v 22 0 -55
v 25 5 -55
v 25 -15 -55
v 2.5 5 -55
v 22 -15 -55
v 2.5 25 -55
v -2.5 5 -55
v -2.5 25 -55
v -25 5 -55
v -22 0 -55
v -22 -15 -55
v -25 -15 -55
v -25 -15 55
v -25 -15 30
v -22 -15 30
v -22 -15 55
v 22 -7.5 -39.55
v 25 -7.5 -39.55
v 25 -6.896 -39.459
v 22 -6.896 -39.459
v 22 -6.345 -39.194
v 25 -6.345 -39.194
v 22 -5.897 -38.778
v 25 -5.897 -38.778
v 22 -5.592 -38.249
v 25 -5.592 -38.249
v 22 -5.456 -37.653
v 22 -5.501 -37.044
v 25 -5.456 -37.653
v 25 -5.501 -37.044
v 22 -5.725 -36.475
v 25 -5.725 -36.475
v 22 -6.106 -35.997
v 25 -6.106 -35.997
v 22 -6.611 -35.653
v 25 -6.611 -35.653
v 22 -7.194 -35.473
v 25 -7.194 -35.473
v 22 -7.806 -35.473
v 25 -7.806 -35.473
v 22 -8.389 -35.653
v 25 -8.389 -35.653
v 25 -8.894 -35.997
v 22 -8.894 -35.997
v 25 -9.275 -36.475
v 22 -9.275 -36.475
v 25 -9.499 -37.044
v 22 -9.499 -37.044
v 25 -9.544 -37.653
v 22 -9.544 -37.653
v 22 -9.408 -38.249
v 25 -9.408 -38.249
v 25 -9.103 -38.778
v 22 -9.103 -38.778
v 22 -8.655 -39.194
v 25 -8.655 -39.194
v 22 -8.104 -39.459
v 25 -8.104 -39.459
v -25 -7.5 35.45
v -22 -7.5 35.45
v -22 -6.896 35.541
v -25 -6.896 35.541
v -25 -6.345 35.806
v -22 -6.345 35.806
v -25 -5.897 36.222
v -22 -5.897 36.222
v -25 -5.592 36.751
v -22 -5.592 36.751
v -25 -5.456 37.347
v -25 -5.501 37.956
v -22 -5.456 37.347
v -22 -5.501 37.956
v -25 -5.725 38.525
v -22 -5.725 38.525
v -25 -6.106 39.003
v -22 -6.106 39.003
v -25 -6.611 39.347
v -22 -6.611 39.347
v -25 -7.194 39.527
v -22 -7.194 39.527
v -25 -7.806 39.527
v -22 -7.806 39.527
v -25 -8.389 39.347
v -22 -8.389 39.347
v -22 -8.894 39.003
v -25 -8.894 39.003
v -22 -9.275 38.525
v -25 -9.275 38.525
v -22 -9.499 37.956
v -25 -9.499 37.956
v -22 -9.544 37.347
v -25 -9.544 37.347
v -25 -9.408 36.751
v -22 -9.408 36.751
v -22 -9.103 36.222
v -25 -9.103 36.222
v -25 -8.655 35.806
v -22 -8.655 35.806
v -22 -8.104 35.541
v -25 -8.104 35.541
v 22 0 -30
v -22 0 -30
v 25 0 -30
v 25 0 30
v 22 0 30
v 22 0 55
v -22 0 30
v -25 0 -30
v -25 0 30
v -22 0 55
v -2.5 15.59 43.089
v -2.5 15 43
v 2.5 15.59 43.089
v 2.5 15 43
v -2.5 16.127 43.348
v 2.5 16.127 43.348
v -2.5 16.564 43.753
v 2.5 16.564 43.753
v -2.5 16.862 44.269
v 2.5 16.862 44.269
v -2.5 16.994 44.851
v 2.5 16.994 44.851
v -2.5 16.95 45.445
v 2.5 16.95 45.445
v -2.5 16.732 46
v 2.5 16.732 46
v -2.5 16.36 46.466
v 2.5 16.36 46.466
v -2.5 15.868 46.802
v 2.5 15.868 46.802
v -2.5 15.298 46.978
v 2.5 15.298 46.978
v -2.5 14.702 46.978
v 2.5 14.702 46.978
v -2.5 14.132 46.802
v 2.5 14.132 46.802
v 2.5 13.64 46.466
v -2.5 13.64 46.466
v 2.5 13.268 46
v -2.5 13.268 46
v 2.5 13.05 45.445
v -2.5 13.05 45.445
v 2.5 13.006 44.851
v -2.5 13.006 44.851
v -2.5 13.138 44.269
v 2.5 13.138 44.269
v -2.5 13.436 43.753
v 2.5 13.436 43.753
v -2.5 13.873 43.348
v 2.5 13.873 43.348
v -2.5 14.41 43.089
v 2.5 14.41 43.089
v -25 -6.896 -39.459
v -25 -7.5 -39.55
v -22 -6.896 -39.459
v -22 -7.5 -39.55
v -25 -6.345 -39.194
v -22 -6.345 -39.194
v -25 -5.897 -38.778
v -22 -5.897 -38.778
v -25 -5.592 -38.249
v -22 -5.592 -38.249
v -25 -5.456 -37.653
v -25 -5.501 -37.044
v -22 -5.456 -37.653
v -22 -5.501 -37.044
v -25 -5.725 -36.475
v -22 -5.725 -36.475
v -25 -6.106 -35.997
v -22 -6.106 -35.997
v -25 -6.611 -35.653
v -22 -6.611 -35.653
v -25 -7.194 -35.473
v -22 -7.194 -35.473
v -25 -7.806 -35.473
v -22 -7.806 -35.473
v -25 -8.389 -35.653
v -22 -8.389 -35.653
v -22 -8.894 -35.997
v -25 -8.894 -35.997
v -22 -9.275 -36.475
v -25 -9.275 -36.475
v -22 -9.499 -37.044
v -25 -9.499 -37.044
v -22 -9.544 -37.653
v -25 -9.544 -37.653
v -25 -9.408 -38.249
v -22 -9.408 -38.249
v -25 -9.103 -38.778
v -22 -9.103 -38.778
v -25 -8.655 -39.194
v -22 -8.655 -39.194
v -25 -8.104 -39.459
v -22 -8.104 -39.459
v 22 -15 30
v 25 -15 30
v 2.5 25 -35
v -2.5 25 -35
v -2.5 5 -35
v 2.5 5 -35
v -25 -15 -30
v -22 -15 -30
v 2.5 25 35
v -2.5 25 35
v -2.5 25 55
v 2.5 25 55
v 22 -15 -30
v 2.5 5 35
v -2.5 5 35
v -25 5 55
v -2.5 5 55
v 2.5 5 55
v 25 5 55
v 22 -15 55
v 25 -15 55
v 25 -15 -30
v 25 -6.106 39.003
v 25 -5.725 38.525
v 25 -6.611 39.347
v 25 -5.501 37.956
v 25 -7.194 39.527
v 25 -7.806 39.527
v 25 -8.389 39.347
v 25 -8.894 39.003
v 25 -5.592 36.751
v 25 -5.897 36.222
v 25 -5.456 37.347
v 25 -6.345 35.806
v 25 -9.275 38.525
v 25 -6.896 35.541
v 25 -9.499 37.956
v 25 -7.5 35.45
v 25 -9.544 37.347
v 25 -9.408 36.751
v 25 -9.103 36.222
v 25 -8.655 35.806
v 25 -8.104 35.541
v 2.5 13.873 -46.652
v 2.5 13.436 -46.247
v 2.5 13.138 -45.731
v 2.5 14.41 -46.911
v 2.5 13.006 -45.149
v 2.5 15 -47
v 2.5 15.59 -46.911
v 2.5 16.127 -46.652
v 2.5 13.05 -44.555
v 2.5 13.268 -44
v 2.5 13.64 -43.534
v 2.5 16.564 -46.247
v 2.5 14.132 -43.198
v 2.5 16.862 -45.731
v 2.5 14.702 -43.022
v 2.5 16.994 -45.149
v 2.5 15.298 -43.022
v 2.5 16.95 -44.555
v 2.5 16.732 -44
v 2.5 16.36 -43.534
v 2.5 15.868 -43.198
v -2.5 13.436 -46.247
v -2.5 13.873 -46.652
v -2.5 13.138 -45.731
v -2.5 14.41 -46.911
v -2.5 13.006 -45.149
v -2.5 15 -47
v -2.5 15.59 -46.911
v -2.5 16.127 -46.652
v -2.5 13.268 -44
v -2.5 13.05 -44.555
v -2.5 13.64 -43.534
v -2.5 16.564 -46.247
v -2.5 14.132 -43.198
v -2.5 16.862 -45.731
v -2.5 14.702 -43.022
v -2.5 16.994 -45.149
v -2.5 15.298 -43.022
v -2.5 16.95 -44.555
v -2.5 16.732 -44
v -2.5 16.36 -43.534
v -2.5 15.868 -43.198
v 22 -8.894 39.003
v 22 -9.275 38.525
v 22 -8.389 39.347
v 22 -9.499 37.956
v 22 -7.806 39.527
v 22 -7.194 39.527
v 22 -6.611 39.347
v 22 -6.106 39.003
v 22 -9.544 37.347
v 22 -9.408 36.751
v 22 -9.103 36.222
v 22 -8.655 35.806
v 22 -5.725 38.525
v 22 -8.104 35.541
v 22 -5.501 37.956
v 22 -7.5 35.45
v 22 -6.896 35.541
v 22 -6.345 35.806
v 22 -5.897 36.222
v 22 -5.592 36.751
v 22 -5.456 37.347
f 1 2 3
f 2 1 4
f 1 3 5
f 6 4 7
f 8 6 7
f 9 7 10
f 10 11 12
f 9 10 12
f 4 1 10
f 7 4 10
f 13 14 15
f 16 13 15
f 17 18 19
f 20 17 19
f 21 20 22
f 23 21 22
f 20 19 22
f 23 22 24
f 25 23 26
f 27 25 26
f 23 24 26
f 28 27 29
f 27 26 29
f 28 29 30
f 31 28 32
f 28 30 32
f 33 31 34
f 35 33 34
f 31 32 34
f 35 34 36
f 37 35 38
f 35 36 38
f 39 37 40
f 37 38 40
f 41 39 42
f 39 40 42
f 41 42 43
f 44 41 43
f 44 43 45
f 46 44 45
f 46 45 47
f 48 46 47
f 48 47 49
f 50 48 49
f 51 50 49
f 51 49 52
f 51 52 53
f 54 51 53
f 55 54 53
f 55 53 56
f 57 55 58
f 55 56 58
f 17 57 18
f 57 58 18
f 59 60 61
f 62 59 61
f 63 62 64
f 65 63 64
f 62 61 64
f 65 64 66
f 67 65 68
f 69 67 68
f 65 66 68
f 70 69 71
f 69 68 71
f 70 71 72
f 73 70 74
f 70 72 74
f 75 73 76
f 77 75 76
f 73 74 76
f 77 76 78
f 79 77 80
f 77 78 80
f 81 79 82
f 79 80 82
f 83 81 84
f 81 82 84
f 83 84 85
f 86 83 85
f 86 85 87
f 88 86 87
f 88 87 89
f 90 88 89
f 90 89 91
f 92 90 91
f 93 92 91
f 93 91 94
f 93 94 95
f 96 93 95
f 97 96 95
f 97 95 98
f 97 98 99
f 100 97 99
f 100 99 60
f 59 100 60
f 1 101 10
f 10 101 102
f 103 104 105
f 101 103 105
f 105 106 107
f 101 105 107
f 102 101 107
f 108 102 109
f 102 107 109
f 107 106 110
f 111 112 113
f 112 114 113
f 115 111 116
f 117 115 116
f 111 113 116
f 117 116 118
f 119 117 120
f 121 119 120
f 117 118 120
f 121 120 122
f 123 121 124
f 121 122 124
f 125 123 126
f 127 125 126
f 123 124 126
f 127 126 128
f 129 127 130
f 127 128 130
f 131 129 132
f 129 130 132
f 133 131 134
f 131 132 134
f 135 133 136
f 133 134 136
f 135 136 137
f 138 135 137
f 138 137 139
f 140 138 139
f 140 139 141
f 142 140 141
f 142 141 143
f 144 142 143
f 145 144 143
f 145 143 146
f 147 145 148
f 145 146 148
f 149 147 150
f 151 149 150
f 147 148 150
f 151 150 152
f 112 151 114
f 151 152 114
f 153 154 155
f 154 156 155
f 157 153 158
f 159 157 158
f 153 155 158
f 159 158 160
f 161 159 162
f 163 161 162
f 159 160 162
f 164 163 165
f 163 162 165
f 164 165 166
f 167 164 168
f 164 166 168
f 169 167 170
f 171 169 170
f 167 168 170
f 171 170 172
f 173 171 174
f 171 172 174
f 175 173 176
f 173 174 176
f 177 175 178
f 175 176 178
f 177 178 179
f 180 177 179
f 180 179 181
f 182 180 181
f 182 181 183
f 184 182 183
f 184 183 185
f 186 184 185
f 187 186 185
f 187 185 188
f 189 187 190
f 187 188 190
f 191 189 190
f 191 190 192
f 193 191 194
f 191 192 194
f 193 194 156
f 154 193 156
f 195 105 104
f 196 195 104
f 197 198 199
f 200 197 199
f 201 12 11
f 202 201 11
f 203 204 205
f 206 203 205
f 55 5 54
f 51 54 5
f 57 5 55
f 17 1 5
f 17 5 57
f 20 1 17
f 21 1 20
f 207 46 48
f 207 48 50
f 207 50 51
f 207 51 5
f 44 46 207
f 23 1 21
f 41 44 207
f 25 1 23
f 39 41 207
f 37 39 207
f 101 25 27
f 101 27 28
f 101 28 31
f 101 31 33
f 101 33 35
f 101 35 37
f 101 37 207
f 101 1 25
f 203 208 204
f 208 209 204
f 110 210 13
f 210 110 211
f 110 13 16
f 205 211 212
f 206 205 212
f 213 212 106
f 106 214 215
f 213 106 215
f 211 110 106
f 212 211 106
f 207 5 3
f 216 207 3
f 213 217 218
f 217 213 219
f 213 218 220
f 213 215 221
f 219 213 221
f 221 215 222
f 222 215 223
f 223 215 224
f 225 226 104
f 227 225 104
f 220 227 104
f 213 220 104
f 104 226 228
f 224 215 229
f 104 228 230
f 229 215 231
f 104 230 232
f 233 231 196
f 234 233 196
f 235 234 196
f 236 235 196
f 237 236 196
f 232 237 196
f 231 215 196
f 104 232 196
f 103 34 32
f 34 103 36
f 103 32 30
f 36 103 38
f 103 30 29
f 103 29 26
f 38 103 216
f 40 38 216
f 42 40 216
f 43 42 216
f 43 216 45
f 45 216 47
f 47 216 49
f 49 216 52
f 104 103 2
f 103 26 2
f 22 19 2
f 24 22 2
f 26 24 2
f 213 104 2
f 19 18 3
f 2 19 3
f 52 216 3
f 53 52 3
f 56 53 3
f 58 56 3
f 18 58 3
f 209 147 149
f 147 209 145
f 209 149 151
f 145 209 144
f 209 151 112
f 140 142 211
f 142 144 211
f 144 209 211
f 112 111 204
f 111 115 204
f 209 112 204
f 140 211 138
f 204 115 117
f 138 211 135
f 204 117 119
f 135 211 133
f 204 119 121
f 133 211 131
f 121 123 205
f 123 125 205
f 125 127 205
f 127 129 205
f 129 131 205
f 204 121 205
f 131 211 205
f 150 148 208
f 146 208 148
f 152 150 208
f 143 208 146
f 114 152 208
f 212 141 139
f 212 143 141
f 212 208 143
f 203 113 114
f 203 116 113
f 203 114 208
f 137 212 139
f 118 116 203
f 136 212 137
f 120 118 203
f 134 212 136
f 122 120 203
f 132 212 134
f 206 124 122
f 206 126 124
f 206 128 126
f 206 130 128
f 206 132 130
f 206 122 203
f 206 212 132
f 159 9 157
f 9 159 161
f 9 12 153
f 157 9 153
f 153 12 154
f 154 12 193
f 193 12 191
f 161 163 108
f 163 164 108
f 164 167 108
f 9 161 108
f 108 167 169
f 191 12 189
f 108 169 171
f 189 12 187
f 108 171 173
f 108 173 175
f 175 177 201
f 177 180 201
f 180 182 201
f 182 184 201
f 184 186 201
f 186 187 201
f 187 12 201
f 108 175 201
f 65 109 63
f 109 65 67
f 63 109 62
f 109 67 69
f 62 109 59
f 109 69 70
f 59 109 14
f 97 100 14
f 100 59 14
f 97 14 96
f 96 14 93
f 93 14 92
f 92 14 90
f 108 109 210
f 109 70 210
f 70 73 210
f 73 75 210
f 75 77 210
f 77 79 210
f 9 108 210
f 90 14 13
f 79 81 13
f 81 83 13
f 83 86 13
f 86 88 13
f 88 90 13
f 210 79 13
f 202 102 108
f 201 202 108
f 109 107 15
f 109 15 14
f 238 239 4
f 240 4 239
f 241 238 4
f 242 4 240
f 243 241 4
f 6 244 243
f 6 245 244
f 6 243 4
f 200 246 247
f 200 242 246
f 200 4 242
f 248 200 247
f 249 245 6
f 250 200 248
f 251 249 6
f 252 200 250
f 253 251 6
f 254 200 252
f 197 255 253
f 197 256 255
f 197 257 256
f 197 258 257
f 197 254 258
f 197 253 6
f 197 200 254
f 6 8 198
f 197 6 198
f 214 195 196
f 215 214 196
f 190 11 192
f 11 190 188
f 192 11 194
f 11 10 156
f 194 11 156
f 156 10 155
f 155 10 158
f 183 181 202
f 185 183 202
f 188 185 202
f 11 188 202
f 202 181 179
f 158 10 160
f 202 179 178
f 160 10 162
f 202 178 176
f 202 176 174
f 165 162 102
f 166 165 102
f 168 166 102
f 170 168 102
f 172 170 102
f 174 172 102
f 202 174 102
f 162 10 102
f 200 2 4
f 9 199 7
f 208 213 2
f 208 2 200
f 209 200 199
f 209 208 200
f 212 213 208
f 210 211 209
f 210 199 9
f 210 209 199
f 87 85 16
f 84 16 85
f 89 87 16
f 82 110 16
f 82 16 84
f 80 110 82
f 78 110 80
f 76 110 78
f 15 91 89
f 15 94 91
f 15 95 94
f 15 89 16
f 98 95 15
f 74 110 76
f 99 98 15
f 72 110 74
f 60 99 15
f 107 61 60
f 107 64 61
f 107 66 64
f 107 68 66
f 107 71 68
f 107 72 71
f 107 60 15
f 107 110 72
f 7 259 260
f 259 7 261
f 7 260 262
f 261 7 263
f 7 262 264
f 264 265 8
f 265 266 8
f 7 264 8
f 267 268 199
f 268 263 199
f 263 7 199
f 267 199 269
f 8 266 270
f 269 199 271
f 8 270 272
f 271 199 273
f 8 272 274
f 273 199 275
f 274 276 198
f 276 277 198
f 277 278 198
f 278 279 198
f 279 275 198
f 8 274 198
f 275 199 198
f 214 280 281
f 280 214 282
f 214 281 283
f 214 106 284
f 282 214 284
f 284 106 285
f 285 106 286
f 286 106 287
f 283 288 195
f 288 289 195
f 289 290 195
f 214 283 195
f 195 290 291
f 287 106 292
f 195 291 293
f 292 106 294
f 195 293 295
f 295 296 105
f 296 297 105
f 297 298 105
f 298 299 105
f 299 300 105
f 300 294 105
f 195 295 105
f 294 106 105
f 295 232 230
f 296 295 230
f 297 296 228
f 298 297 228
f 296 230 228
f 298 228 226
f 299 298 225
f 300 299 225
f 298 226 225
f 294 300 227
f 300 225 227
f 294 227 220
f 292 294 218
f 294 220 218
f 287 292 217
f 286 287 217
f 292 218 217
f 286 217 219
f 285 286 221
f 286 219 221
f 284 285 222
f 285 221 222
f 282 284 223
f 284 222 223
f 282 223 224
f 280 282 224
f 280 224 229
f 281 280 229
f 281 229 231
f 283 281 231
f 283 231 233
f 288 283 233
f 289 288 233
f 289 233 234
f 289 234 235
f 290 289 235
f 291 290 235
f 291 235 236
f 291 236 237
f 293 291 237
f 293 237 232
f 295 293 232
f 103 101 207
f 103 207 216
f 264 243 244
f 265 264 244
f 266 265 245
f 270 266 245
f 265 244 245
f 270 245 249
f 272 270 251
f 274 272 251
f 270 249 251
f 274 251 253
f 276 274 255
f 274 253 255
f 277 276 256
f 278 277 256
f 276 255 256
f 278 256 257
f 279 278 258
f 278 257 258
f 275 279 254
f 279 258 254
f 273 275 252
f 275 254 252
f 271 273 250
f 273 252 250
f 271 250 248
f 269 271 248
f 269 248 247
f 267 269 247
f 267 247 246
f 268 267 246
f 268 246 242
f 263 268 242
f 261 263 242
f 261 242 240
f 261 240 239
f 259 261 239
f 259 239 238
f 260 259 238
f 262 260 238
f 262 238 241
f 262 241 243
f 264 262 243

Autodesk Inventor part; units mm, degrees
ref_plane "YZ Plane" through (0, 0, 0) normal (1, 0, 0) x (0, 1, 0)
ref_plane "XZ Plane" through (0, 0, 0) normal (0, 1, 0) x (-1, 0, 0)
ref_plane "XY Plane" through (0, 0, 0) normal (0, 0, 1) x (1, 0, 0)
sketch "Sketch1" plane through (0, 0, 0) normal (0, 1, 0) x (-1, 0, 0)
  line L0 (25, 55) -> (-25, 55)
  line L1 (-25, 55) -> (-25, -55)
  line L2 (-25, -55) -> (25, -55)
  line L3 (25, -55) -> (25, 55)
  line L4 (25, 55) -> (-25, -55) construction
  line L5 (-25, 55) -> (25, -55) construction
  point P0 (0, 0)
  dimension "d0" = 50
  dimension "d1" = 110
extrude "Extrusion1" add sketch "Sketch1" along normal blind 5
sketch "Sketch2" plane through (0, 0, 0) normal (0, -1, 0) x (1, 0, 0)
  line L0 (25, 55) -> (25, -55) projected
  line L1 (-25, 55) -> (25, 55) projected
  line L2 (-25, -55) -> (-25, 55) projected
  line L3 (25, -55) -> (-25, -55) projected
  line L4 (25, 55) -> (22, 55)
  line L5 (22, 55) -> (22, 30)
  line L6 (22, 30) -> (25, 30)
  line L7 (25, 30) -> (25, 55)
  line L8 (-25, 55) -> (-22, 55)
  line L9 (-22, 55) -> (-22, 30)
  line L10 (-22, 30) -> (-25, 30)
  line L11 (-25, 30) -> (-25, 55)
  line L12 (25, -55) -> (22, -55)
  line L13 (22, -55) -> (22, -30)
  line L14 (22, -30) -> (25, -30)
  line L15 (25, -30) -> (25, -55)
  line L16 (-25, -55) -> (-22, -55)
  line L17 (-22, -55) -> (-22, -30)
  line L18 (-22, -30) -> (-25, -30)
  line L19 (-25, -30) -> (-25, -55)
  point P0 (0, 0)
  dimension "d4" = 3
  dimension "d5" = 3
  dimension "d6" = 3
  dimension "d7" = 25
  dimension "d8" = 25
  dimension "d9" = 25
  dimension "d10" = 25
extrude "Extrusion2" add sketch "Sketch2" along normal blind 15 contours L0 L6 L5 L1 | L0 L3 L13 L14 | L9 L10 L2 L1 | L3 L2 L18 L17
sketch "Sketch3" plane through (25, 5, 55) normal (1, 0, 0) x (0, 0, -1)
  circle A0 centre (17.5, -12.5) radius 2.05
  circle A1 centre (92.5, -12.5) radius 2.05
  line L0 (25, -20) -> (0, -20) projected
  line L1 (110, -20) -> (85, -20) projected
  line L2 (85, -5) -> (85, -20) projected
  line L3 (25, -5) -> (25, -20) projected
  point P0 (55, -5)
  dimension "d13" = 4.1
  dimension "d14" = 4.1
  dimension "d15" = 7.5
  dimension "d16" = 7.5
  dimension "d17" = 7.5
  dimension "d18" = 7.5
extrude "Extrusion3" cut sketch "Sketch3" against normal through all
sketch "Sketch5" plane through (0, 0, 0) normal (1, 0, 0) x (0, 1, 0)
  line L0 (25, 55) -> (5, 55)
  line L1 (5, 55) -> (5, 35)
  line L2 (5, 35) -> (25, 35)
  line L3 (25, 35) -> (25, 55)
  line L4 (25, -35) -> (5, -35)
  line L5 (5, -35) -> (5, -55)
  line L6 (5, -55) -> (25, -55)
  line L7 (25, -55) -> (25, -35)
  line L8 (5, 55) -> (5, -55) projected
  line L9 (-15, -55) -> (5, -55) projected
  line L10 (5, 55) -> (-15, 55) projected
  point P0 (0, 0)
  dimension "d21" = 20
  dimension "d22" = 20
  dimension "d23" = 20
  dimension "d24" = 20
extrude "Extrusion4" add sketch "Sketch5" along normal mid plane 5
sketch "Sketch6" plane through (2.5, 0, 0) normal (1, 0, 0) x (0, 0, -1)
  line L0 (-35, 5) -> (-55, 5) projected
  line L1 (-35, 5) -> (-35, 25) projected
  line L2 (-35, 25) -> (-55, 25) projected
  line L3 (-55, 25) -> (-55, 5) projected
  line L4 (35, 25) -> (35, 5) projected
  line L5 (55, 5) -> (35, 5) projected
  line L6 (55, 5) -> (55, 25) projected
  line L7 (55, 25) -> (35, 25) projected
  circle A0 centre (-45, 15) radius 2
  circle A1 centre (45, 15) radius 2
  point P0 (0, 0)
  dimension "d29" = 4
  dimension "d30" = 4
extrude "Extrusion5" cut sketch "Sketch6" against normal blind 5 contours A0 | A1
properties part number "gripper_case_bracket"
